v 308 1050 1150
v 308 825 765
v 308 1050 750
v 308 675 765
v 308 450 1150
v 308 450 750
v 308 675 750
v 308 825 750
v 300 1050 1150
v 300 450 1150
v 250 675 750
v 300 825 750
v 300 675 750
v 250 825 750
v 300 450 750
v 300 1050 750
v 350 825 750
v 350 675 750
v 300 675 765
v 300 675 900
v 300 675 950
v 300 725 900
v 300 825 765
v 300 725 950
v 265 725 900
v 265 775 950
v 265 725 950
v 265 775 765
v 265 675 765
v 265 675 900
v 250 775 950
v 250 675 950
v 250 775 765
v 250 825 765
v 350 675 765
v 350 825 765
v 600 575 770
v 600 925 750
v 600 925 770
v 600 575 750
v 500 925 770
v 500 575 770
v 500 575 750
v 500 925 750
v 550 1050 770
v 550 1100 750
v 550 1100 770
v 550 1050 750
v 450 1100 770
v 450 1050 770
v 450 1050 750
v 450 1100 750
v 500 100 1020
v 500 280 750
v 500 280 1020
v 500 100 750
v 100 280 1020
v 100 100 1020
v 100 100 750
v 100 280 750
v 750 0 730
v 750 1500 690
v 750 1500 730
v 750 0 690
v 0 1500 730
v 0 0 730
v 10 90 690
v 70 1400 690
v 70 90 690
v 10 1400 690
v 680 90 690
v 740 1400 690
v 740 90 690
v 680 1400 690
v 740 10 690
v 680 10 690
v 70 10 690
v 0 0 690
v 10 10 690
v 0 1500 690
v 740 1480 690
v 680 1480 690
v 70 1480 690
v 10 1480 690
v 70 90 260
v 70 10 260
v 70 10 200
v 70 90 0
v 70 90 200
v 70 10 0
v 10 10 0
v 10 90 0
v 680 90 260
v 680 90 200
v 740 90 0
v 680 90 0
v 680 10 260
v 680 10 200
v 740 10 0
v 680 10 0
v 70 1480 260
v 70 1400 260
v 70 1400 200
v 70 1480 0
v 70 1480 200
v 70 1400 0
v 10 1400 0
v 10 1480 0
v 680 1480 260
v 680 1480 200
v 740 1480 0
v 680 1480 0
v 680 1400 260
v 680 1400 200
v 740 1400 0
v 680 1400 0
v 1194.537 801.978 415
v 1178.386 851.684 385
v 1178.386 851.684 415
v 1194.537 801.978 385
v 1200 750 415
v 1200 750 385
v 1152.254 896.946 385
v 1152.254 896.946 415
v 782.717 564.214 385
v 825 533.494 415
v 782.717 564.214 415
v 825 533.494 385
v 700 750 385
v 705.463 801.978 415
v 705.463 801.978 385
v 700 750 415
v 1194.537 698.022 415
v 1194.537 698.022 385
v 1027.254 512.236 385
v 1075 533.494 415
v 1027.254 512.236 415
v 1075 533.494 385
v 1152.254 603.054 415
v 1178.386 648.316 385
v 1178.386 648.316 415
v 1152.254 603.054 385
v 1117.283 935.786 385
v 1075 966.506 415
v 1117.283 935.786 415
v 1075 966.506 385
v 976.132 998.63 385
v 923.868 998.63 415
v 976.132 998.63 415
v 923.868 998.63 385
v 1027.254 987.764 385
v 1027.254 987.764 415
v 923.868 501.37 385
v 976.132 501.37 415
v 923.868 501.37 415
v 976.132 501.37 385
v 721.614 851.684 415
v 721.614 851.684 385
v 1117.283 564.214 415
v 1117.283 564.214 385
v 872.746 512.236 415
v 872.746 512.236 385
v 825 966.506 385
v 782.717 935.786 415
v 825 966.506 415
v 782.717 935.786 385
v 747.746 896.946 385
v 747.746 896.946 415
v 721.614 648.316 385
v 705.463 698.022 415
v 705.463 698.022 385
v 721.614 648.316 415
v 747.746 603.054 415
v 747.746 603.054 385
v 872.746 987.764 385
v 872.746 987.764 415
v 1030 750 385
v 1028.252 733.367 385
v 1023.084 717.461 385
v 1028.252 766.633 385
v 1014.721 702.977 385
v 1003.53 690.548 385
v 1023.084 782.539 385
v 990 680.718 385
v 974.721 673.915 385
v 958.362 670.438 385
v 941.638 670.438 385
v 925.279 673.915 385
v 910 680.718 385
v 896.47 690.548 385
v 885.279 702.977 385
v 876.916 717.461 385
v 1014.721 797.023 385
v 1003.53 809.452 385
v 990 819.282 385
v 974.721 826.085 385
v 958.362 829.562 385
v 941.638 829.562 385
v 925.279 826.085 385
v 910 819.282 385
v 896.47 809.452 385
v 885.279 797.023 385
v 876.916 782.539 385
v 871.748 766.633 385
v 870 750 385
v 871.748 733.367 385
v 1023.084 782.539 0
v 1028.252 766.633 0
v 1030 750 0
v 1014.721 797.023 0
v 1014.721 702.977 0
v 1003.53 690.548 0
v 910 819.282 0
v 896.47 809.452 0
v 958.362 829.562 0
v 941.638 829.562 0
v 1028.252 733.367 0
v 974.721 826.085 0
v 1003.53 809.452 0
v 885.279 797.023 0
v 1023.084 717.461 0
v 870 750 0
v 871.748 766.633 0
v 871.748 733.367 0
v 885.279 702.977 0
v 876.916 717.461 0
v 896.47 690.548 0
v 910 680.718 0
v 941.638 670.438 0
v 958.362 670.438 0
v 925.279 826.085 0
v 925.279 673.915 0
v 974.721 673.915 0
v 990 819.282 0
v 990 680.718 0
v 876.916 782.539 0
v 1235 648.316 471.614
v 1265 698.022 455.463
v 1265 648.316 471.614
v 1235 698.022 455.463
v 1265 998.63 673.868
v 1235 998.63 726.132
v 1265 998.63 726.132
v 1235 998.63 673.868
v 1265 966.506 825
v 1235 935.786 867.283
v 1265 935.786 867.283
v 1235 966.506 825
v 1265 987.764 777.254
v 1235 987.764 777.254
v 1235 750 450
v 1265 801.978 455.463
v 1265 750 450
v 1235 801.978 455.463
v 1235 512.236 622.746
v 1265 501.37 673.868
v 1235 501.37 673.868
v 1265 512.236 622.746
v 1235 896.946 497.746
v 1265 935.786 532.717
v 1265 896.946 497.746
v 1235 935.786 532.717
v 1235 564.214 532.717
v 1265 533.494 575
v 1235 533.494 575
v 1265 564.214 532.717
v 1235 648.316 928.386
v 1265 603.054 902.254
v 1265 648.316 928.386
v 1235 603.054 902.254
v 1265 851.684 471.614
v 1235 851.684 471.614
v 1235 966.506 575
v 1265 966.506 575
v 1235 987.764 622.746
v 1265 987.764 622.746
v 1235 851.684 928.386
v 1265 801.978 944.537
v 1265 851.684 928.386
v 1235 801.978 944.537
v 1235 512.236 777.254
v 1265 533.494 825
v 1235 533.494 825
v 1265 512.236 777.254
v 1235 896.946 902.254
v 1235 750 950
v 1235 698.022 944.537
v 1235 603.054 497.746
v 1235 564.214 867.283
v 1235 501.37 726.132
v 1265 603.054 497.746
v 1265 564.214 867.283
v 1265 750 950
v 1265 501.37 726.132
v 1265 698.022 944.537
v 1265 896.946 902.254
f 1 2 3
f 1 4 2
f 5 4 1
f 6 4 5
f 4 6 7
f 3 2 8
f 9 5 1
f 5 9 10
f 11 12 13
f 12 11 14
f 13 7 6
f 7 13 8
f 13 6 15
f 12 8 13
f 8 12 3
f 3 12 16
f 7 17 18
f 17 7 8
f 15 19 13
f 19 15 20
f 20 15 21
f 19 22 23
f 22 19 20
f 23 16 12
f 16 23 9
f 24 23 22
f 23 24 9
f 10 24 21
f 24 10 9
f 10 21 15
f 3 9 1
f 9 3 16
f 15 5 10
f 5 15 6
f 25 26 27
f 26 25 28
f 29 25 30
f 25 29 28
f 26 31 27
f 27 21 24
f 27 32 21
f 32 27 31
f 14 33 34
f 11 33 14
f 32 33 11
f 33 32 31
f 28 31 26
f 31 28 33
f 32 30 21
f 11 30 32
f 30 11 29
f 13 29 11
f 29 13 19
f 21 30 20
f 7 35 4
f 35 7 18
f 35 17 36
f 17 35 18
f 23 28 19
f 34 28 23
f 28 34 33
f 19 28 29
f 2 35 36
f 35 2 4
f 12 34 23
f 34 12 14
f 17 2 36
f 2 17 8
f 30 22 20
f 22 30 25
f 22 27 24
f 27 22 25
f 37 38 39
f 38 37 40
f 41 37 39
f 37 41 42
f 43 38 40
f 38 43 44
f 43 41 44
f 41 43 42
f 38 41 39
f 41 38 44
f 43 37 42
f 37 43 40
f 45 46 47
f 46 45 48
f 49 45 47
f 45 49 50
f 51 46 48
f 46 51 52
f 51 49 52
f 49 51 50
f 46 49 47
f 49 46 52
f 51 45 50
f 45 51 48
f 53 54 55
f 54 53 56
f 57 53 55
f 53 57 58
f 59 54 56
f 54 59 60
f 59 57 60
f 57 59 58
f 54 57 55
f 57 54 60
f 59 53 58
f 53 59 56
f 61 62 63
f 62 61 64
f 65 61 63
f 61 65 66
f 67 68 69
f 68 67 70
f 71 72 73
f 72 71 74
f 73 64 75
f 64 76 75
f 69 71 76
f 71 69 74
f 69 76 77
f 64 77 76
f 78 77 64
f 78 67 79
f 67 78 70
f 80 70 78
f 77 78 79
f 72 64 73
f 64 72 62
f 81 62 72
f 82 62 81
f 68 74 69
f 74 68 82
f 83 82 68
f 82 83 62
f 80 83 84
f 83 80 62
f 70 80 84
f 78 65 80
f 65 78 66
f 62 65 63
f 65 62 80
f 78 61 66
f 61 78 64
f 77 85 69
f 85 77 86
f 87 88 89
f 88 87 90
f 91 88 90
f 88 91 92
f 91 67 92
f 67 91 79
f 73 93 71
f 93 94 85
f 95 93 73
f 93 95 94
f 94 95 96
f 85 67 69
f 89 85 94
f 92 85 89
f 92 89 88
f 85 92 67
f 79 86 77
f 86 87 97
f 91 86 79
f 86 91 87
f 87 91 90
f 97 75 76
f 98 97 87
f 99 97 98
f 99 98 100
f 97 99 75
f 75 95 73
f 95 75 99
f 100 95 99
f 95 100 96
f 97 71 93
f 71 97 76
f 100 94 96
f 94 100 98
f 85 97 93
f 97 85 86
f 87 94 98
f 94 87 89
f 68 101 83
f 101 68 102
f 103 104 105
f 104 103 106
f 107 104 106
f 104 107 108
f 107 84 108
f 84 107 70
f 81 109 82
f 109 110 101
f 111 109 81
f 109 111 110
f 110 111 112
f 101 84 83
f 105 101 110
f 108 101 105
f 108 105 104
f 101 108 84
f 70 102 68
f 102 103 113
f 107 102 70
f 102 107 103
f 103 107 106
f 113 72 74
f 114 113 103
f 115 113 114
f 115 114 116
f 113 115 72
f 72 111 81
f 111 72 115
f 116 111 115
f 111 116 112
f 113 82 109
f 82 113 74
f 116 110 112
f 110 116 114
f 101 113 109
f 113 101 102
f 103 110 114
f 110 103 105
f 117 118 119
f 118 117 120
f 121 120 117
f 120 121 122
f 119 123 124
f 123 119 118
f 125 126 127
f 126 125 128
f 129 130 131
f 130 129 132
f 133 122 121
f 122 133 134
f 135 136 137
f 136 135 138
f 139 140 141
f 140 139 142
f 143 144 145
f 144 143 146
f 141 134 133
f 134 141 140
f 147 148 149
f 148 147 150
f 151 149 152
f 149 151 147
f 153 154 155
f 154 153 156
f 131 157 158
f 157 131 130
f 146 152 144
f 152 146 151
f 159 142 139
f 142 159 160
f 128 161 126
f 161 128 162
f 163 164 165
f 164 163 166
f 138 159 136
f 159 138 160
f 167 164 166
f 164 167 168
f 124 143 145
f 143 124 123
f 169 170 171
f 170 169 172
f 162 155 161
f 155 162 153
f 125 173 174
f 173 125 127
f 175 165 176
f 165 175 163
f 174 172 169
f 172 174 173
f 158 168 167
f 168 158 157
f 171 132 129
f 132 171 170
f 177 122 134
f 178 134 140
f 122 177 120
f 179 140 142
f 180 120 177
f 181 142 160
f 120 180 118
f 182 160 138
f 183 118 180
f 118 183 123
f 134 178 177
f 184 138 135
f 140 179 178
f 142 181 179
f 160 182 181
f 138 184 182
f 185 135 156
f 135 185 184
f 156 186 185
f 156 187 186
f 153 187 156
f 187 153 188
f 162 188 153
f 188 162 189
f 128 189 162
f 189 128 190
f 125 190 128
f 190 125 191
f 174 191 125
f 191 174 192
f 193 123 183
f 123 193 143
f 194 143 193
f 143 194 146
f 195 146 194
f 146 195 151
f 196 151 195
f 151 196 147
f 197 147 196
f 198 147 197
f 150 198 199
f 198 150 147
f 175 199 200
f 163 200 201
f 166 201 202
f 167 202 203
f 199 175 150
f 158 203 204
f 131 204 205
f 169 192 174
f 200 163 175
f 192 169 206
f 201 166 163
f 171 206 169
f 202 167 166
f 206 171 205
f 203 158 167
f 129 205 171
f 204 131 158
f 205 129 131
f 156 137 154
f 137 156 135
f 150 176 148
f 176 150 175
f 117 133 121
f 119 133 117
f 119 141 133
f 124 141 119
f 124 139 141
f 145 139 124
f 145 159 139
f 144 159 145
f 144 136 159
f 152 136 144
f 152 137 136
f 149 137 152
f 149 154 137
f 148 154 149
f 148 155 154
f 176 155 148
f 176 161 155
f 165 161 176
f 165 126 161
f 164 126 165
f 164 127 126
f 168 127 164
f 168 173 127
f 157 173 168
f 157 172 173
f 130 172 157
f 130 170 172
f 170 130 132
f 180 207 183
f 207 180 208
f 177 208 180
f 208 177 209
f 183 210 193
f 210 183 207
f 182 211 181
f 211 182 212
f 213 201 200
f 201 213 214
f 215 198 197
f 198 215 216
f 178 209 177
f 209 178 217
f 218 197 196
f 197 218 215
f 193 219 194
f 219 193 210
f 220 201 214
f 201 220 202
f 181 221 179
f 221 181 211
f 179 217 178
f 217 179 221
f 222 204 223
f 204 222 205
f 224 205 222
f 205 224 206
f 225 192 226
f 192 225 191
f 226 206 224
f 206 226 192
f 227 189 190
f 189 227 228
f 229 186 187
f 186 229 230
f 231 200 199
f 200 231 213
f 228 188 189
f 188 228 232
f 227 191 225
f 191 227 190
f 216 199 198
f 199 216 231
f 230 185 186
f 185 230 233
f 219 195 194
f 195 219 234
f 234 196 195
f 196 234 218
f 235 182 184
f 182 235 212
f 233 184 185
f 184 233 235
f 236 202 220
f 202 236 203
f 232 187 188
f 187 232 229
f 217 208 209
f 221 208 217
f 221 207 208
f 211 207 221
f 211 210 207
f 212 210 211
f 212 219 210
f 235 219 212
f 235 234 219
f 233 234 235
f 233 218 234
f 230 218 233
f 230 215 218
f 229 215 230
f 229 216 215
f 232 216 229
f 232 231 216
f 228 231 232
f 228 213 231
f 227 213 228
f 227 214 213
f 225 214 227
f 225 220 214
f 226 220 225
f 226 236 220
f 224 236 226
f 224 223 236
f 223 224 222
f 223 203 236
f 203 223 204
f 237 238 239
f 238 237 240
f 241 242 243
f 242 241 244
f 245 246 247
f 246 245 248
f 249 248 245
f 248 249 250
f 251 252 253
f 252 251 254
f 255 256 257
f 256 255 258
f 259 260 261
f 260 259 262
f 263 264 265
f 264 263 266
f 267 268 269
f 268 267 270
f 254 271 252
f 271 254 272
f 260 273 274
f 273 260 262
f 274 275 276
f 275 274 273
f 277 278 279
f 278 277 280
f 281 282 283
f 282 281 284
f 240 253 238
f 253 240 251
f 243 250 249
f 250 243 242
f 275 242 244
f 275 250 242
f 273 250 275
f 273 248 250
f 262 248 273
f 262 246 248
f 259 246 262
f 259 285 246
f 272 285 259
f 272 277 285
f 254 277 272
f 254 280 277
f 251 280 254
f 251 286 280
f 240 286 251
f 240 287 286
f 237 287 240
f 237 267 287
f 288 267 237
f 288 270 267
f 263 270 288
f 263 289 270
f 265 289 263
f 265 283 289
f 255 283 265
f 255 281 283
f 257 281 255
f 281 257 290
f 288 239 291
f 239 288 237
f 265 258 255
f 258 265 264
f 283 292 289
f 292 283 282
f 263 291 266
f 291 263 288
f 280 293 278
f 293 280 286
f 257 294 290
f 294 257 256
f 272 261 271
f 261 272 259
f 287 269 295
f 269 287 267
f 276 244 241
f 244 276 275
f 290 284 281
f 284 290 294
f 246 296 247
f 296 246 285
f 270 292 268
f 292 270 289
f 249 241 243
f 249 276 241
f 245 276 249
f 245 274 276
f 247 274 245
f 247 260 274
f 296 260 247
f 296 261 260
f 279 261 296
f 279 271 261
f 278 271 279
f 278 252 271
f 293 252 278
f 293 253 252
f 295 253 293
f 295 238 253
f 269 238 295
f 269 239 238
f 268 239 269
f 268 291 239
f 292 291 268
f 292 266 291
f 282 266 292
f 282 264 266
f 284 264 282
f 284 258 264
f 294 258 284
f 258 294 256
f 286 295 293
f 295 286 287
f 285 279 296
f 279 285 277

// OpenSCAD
// top
translate([0, 0, 690])
    color("White")
    cube([750, 1500 , 40]);

// legs
translate([10, 10, 0])
    color("White")
    cube([60, 80 , 690]);
    
translate([680, 10, 0])
    color("White")
    cube([60, 80 , 690]);
    
translate([10, 10, 200])
    color("White")
    cube([700, 80, 60]);
    
translate([10, 1400, 0])
    color("White")
    cube([60, 80, 690]);
    
translate([680, 1400, 0])
    color("White")
    cube([60, 80, 690]);
    
translate([10, 1400, 200])
    color("White")
    cube([700, 80, 60]);
    
// pc + monitor

translate([300, 450, 750]){
    color("Black")
    cube([8, 600 , 400]);
    translate([-50, 225, 0]){
        color("Black")
        cube([15, 100, 200]);
    }
    translate([-50, 225, 0]){
        color("Black")
        cube([100, 150, 15]);
    }
    translate([-45, 225, 150]){
        color("Black")
        cube([45, 50, 50]);
    }
    translate([200, 125, 0]){
        color("Black")
        cube([100, 350, 20]);
    }
    translate([150, 600, 0]){
        color("Black")
        cube([100, 50, 20]);
    }
    translate([-200, -350, 0]){
        color("Black")
        cube([400, 180, 270]);
    }      
}

// chair
translate([950, 750, 400]){
    color("White")
    cylinder(h=30, r1=250, r2=250, center=true); 
}

translate([950, 750, 0]){
    color("White")
    cylinder(h=400, r1=80, r2=80, center=false); 
}

translate([1250, 750, 700]){
    color("White")
    rotate([0, 90, 0])
    cylinder(h=30, r1=250, r2=250, center=true); 
}
